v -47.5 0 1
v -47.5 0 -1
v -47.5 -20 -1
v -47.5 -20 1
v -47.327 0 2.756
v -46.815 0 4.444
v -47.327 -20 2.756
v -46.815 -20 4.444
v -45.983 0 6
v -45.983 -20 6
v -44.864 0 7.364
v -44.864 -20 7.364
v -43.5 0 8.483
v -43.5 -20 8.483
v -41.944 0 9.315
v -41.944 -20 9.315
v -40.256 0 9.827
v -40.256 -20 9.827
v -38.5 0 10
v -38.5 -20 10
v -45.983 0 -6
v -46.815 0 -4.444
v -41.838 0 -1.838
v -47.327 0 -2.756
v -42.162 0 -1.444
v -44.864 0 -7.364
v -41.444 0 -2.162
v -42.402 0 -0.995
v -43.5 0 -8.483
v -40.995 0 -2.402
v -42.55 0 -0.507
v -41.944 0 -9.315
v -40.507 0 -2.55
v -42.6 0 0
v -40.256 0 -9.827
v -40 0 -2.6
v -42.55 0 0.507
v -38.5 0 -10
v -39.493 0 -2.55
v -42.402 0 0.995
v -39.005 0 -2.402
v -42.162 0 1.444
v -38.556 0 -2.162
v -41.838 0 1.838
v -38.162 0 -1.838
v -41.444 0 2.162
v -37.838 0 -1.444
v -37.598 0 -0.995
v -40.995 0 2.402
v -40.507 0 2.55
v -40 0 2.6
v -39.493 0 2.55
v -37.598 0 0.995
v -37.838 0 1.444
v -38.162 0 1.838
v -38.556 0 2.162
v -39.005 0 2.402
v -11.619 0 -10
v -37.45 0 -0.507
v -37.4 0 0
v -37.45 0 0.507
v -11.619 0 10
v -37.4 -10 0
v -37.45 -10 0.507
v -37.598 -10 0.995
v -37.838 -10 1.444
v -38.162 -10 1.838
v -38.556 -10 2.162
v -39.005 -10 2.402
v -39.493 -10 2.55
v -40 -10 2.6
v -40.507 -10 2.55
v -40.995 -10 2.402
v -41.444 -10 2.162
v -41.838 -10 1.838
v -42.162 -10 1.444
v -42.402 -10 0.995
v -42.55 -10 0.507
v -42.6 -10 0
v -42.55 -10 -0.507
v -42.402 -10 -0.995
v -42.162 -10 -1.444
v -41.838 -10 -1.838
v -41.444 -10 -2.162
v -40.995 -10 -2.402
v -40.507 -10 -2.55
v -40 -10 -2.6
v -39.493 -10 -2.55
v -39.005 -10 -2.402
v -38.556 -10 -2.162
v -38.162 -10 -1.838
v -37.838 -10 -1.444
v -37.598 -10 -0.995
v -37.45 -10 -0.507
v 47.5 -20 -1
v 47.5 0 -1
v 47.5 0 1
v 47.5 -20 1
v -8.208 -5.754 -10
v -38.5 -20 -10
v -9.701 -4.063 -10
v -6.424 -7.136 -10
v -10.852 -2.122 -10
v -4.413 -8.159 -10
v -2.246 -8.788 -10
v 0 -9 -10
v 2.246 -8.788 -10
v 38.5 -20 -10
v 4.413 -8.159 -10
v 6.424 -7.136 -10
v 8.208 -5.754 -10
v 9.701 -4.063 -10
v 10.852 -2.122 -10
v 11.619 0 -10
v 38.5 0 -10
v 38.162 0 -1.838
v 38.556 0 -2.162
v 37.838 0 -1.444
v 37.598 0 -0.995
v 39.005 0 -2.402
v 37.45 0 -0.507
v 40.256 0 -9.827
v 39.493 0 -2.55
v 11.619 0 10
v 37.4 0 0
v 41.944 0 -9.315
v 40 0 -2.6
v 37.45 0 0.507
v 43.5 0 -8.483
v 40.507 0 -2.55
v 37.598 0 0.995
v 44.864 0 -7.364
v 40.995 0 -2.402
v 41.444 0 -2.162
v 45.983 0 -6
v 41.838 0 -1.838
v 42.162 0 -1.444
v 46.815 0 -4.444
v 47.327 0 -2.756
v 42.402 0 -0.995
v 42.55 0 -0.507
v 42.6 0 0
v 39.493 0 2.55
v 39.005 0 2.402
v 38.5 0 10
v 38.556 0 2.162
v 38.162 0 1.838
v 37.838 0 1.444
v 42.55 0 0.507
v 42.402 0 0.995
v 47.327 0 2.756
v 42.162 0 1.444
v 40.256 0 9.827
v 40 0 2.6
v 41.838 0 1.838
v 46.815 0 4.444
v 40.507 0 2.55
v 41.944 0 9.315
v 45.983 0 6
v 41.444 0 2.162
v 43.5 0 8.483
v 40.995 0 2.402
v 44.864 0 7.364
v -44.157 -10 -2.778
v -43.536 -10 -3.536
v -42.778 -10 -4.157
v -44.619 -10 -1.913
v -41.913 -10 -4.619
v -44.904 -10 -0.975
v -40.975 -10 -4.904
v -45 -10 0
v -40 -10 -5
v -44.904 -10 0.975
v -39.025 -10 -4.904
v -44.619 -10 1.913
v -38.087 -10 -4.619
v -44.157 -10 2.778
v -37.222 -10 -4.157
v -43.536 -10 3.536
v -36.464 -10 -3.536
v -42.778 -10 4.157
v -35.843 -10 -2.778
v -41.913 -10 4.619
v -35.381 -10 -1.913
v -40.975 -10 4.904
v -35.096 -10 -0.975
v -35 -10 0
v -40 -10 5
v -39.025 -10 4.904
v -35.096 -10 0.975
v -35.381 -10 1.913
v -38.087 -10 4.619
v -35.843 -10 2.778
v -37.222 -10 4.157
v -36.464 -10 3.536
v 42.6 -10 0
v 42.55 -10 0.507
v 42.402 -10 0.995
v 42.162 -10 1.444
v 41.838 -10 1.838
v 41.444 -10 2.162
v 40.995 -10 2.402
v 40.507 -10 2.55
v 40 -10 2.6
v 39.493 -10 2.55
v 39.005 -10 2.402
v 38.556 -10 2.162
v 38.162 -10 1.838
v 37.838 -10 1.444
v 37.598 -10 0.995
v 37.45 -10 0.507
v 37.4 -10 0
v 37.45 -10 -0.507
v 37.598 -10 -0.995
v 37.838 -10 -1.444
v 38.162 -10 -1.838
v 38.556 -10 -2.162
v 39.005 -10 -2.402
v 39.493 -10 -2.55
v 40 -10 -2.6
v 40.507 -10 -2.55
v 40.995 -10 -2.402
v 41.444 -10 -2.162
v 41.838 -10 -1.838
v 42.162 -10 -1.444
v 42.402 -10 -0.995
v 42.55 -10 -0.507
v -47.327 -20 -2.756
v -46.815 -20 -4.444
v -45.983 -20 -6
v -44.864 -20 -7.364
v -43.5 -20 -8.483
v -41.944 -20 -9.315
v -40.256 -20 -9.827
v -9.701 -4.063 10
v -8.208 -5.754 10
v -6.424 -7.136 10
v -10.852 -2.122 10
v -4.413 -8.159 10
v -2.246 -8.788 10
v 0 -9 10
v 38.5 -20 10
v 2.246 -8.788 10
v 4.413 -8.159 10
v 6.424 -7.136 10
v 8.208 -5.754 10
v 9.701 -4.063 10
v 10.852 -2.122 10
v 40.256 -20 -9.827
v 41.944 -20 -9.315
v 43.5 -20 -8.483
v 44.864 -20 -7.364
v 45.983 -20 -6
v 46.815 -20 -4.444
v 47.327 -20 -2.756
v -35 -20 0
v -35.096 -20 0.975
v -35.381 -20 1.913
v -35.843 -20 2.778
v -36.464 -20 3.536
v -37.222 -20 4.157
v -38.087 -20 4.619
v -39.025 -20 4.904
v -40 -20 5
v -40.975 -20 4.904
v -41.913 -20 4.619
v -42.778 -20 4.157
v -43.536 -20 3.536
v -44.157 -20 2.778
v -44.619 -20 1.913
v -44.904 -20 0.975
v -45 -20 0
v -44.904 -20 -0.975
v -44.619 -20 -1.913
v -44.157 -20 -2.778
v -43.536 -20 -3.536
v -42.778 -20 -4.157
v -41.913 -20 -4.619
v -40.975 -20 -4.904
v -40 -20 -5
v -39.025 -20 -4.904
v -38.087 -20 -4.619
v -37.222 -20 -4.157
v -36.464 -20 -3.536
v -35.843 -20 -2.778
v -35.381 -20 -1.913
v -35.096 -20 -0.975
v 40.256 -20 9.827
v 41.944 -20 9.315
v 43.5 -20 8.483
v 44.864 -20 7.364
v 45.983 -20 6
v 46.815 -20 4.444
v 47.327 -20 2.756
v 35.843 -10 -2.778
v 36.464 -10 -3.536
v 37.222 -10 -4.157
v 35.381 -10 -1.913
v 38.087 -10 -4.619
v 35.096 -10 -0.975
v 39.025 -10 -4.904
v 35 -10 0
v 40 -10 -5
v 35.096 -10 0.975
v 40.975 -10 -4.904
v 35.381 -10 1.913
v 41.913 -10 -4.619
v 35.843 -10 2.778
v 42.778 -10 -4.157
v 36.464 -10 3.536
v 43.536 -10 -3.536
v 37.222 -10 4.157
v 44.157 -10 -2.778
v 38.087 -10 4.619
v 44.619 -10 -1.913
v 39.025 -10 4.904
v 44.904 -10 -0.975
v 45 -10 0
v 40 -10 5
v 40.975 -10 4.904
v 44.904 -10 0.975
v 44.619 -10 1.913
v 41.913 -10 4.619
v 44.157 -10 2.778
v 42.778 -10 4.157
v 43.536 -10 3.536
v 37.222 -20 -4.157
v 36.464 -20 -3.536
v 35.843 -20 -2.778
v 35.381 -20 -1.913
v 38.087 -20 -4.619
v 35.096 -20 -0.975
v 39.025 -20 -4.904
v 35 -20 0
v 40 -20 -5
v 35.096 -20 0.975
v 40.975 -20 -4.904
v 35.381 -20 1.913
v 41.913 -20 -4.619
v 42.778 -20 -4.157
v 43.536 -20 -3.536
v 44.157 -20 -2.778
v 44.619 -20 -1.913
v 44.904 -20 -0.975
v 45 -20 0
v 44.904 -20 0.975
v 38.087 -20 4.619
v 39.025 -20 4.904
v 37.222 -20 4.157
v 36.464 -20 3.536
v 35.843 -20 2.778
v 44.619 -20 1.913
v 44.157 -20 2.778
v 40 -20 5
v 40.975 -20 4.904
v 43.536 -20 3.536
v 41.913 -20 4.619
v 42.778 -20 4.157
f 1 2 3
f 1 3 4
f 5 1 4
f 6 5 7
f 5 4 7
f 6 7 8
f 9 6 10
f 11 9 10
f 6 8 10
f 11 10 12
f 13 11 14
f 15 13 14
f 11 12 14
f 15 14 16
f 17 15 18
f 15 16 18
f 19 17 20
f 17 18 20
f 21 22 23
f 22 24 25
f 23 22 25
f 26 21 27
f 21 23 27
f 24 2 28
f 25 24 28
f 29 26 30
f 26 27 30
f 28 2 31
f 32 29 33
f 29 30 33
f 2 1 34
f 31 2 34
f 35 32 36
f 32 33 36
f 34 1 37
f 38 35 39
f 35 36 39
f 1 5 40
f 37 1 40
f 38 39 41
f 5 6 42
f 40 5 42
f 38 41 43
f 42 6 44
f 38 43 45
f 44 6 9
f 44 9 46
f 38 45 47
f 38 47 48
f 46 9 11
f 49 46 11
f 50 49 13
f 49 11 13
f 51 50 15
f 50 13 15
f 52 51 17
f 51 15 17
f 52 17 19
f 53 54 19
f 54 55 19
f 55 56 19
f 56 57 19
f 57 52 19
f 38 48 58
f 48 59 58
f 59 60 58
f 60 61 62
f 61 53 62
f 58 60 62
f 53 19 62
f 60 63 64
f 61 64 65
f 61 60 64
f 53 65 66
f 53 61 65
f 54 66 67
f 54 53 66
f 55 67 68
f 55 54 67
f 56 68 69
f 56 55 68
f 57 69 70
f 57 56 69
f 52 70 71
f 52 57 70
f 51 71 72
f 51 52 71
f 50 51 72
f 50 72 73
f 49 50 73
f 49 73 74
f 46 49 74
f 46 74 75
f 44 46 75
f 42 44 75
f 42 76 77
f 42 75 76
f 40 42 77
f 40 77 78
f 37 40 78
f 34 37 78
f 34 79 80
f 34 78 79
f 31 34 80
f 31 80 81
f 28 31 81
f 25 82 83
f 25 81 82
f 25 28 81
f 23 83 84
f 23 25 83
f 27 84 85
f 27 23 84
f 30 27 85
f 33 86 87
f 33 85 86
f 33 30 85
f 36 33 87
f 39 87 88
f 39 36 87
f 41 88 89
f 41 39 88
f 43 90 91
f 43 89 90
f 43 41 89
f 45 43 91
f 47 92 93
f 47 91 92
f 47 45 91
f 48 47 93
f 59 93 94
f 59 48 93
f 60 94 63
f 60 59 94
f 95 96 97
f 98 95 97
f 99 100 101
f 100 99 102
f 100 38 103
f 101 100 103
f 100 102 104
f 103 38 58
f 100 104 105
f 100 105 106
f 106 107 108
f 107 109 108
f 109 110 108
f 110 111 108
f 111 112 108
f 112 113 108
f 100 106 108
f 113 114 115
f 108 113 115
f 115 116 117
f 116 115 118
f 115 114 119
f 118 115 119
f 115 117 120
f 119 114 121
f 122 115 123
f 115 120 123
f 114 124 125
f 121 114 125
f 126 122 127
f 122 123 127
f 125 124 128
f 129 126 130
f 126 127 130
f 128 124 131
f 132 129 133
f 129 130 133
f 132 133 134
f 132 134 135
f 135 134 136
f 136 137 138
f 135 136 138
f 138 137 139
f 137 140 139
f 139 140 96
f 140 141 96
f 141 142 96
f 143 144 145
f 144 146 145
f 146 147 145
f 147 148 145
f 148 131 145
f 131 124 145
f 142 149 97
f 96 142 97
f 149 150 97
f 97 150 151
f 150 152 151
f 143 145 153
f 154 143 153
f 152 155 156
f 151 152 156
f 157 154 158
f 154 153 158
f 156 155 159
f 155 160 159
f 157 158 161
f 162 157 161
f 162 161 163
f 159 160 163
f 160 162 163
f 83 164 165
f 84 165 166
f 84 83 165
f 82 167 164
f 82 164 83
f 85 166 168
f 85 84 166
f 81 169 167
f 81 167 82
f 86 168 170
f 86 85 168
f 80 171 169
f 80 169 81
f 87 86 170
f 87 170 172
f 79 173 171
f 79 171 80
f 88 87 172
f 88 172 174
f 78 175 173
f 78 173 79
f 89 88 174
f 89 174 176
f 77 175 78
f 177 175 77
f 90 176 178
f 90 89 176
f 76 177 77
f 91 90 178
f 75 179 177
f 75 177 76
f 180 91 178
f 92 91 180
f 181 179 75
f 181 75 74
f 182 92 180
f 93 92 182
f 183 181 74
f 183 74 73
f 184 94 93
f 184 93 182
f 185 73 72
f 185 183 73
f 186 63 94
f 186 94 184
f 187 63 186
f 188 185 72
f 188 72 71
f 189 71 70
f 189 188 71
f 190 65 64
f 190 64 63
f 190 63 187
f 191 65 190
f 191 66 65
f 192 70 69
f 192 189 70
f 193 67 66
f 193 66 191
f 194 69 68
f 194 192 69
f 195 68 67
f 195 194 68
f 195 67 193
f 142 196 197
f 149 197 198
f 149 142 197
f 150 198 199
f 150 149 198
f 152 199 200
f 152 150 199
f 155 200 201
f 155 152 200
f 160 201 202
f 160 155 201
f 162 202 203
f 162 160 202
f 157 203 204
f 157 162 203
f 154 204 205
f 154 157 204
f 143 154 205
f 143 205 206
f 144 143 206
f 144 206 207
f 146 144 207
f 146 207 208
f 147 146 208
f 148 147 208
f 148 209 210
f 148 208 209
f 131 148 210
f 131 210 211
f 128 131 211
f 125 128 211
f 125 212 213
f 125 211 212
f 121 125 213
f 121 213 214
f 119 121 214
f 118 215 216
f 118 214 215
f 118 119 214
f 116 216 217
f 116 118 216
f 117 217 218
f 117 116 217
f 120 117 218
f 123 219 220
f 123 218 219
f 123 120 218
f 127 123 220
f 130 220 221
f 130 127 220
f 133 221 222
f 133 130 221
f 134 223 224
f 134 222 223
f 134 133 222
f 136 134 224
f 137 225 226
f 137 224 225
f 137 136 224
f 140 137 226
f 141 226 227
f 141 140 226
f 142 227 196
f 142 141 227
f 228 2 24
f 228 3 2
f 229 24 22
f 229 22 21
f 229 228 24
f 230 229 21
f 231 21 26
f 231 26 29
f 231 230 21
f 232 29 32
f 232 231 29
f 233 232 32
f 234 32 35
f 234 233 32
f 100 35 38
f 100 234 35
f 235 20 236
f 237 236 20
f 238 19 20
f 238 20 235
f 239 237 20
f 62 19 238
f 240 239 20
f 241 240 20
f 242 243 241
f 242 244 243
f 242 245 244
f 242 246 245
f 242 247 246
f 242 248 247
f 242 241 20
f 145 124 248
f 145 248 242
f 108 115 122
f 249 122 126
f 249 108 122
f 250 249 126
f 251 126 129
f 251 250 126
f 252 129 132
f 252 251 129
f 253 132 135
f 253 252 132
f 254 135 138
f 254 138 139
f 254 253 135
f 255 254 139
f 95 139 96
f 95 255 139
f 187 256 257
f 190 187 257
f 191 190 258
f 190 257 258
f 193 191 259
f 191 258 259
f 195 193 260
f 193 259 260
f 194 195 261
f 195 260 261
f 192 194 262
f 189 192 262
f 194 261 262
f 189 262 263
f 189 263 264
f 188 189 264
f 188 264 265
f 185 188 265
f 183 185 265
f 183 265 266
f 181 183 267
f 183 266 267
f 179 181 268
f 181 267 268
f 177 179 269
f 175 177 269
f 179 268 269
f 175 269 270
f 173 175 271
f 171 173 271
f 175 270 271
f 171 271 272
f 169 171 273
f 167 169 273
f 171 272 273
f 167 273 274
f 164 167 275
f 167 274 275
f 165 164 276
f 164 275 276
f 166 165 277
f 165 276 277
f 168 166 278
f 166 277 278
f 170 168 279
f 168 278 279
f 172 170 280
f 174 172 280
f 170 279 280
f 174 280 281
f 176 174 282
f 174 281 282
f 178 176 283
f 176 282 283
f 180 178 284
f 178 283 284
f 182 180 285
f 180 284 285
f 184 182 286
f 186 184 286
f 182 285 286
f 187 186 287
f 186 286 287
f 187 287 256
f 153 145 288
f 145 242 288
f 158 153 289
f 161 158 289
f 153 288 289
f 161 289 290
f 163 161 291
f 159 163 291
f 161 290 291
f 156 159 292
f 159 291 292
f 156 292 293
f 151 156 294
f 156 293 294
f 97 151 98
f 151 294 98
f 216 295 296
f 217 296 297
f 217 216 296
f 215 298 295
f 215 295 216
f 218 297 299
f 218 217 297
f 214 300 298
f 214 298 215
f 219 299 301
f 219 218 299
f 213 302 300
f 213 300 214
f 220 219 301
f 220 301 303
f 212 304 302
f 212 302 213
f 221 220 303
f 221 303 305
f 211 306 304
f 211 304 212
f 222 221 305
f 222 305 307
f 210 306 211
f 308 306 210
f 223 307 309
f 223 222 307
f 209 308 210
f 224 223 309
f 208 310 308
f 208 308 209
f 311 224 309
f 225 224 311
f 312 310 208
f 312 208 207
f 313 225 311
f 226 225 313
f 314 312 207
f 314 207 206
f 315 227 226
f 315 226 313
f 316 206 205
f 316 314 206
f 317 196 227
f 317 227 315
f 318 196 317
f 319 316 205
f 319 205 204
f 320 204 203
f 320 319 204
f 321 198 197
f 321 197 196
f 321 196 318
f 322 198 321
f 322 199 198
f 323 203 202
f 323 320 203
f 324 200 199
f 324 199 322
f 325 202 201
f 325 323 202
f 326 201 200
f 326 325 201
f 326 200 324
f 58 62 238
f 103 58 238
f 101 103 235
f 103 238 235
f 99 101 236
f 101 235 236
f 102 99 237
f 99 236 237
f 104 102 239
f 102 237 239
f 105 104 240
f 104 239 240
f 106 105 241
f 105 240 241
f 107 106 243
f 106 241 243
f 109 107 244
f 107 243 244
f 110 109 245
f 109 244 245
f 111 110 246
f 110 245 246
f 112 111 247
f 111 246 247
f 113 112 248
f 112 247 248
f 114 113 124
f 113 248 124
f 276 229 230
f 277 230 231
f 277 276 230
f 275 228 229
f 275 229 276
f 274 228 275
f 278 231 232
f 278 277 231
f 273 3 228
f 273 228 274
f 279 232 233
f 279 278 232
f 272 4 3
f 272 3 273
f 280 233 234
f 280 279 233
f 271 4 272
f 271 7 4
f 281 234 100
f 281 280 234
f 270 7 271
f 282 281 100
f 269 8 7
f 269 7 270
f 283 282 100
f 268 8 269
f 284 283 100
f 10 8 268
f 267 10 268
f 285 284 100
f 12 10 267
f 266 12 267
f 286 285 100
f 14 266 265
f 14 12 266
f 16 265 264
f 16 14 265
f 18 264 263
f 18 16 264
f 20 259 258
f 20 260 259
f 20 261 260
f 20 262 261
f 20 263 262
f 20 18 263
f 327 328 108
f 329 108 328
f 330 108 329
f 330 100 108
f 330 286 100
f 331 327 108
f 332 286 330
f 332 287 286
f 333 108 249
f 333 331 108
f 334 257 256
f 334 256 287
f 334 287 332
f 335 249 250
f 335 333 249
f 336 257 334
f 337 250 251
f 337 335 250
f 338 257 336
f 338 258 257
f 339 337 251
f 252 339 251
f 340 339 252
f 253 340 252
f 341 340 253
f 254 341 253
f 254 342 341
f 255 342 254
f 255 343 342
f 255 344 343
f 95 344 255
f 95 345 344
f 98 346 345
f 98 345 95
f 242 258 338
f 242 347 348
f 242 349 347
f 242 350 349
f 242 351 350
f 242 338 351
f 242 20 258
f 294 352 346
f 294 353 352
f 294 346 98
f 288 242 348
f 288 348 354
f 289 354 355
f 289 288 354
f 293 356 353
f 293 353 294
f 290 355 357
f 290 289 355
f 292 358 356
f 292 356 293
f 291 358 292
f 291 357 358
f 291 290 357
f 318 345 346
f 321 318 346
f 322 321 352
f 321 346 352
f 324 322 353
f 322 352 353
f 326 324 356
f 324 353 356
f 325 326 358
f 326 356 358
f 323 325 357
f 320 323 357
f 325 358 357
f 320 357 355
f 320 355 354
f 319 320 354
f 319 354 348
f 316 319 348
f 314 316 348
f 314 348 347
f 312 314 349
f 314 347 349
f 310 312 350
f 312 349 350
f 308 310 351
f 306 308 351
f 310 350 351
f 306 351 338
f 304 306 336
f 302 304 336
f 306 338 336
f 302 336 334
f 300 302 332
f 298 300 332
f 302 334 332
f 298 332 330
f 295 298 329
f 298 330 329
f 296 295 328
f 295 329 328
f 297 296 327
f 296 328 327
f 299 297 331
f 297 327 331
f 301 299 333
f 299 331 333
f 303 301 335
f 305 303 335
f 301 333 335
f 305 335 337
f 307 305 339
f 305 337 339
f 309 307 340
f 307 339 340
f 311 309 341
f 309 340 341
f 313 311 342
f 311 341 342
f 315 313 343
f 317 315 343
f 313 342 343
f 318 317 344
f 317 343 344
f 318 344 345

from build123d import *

# Parameters (mm, degrees)
SKETCH_W        = 95
SKETCH_H        = 20
SKETCH_R        = 2.6
PAD_DEPTH       = 20
SKETCH001_R     = 12
POCKET_DEPTH    = 20.001
SKETCH002_R     = 5
POCKET001_DEPTH = 10
FILLET_R        = 9


with BuildPart() as part:
    # Sketch → Pad (new body)
    with BuildSketch(Plane.XZ):
        Rectangle(SKETCH_W, SKETCH_H)
        with Locations((-40, 0)):
            Circle(SKETCH_R, mode=Mode.SUBTRACT)
        with Locations((40, 0)):
            Circle(SKETCH_R, mode=Mode.SUBTRACT)
    extrude(amount=PAD_DEPTH)

    # Sketch001 (on Face2 of Pad) → Pocket (cut, through all)
    with BuildSketch(Plane.XY.offset(10)):
        with Locations((0, 3)):
            Circle(SKETCH001_R)
    extrude(amount=-POCKET_DEPTH, mode=Mode.SUBTRACT)

    # Sketch002 (on Face5 of Pocket) → Pocket001 (cut)
    with BuildSketch(Plane.XZ.offset(20)):
        with Locations((-40, 0)):
            Circle(SKETCH002_R)
        with Locations((40, 0)):
            Circle(SKETCH002_R)
    extrude(amount=-POCKET001_DEPTH, mode=Mode.SUBTRACT)

    # Fillet
    fillet_edges = [part.edges().sort_by_distance(p)[0] for p in [
        (-47.5, -10, 10),
        (-47.5, -10, -10),
        (47.5, -10, 10),
        (47.5, -10, -10),
    ]]
    fillet(fillet_edges, radius=FILLET_R)


solid = part.part
